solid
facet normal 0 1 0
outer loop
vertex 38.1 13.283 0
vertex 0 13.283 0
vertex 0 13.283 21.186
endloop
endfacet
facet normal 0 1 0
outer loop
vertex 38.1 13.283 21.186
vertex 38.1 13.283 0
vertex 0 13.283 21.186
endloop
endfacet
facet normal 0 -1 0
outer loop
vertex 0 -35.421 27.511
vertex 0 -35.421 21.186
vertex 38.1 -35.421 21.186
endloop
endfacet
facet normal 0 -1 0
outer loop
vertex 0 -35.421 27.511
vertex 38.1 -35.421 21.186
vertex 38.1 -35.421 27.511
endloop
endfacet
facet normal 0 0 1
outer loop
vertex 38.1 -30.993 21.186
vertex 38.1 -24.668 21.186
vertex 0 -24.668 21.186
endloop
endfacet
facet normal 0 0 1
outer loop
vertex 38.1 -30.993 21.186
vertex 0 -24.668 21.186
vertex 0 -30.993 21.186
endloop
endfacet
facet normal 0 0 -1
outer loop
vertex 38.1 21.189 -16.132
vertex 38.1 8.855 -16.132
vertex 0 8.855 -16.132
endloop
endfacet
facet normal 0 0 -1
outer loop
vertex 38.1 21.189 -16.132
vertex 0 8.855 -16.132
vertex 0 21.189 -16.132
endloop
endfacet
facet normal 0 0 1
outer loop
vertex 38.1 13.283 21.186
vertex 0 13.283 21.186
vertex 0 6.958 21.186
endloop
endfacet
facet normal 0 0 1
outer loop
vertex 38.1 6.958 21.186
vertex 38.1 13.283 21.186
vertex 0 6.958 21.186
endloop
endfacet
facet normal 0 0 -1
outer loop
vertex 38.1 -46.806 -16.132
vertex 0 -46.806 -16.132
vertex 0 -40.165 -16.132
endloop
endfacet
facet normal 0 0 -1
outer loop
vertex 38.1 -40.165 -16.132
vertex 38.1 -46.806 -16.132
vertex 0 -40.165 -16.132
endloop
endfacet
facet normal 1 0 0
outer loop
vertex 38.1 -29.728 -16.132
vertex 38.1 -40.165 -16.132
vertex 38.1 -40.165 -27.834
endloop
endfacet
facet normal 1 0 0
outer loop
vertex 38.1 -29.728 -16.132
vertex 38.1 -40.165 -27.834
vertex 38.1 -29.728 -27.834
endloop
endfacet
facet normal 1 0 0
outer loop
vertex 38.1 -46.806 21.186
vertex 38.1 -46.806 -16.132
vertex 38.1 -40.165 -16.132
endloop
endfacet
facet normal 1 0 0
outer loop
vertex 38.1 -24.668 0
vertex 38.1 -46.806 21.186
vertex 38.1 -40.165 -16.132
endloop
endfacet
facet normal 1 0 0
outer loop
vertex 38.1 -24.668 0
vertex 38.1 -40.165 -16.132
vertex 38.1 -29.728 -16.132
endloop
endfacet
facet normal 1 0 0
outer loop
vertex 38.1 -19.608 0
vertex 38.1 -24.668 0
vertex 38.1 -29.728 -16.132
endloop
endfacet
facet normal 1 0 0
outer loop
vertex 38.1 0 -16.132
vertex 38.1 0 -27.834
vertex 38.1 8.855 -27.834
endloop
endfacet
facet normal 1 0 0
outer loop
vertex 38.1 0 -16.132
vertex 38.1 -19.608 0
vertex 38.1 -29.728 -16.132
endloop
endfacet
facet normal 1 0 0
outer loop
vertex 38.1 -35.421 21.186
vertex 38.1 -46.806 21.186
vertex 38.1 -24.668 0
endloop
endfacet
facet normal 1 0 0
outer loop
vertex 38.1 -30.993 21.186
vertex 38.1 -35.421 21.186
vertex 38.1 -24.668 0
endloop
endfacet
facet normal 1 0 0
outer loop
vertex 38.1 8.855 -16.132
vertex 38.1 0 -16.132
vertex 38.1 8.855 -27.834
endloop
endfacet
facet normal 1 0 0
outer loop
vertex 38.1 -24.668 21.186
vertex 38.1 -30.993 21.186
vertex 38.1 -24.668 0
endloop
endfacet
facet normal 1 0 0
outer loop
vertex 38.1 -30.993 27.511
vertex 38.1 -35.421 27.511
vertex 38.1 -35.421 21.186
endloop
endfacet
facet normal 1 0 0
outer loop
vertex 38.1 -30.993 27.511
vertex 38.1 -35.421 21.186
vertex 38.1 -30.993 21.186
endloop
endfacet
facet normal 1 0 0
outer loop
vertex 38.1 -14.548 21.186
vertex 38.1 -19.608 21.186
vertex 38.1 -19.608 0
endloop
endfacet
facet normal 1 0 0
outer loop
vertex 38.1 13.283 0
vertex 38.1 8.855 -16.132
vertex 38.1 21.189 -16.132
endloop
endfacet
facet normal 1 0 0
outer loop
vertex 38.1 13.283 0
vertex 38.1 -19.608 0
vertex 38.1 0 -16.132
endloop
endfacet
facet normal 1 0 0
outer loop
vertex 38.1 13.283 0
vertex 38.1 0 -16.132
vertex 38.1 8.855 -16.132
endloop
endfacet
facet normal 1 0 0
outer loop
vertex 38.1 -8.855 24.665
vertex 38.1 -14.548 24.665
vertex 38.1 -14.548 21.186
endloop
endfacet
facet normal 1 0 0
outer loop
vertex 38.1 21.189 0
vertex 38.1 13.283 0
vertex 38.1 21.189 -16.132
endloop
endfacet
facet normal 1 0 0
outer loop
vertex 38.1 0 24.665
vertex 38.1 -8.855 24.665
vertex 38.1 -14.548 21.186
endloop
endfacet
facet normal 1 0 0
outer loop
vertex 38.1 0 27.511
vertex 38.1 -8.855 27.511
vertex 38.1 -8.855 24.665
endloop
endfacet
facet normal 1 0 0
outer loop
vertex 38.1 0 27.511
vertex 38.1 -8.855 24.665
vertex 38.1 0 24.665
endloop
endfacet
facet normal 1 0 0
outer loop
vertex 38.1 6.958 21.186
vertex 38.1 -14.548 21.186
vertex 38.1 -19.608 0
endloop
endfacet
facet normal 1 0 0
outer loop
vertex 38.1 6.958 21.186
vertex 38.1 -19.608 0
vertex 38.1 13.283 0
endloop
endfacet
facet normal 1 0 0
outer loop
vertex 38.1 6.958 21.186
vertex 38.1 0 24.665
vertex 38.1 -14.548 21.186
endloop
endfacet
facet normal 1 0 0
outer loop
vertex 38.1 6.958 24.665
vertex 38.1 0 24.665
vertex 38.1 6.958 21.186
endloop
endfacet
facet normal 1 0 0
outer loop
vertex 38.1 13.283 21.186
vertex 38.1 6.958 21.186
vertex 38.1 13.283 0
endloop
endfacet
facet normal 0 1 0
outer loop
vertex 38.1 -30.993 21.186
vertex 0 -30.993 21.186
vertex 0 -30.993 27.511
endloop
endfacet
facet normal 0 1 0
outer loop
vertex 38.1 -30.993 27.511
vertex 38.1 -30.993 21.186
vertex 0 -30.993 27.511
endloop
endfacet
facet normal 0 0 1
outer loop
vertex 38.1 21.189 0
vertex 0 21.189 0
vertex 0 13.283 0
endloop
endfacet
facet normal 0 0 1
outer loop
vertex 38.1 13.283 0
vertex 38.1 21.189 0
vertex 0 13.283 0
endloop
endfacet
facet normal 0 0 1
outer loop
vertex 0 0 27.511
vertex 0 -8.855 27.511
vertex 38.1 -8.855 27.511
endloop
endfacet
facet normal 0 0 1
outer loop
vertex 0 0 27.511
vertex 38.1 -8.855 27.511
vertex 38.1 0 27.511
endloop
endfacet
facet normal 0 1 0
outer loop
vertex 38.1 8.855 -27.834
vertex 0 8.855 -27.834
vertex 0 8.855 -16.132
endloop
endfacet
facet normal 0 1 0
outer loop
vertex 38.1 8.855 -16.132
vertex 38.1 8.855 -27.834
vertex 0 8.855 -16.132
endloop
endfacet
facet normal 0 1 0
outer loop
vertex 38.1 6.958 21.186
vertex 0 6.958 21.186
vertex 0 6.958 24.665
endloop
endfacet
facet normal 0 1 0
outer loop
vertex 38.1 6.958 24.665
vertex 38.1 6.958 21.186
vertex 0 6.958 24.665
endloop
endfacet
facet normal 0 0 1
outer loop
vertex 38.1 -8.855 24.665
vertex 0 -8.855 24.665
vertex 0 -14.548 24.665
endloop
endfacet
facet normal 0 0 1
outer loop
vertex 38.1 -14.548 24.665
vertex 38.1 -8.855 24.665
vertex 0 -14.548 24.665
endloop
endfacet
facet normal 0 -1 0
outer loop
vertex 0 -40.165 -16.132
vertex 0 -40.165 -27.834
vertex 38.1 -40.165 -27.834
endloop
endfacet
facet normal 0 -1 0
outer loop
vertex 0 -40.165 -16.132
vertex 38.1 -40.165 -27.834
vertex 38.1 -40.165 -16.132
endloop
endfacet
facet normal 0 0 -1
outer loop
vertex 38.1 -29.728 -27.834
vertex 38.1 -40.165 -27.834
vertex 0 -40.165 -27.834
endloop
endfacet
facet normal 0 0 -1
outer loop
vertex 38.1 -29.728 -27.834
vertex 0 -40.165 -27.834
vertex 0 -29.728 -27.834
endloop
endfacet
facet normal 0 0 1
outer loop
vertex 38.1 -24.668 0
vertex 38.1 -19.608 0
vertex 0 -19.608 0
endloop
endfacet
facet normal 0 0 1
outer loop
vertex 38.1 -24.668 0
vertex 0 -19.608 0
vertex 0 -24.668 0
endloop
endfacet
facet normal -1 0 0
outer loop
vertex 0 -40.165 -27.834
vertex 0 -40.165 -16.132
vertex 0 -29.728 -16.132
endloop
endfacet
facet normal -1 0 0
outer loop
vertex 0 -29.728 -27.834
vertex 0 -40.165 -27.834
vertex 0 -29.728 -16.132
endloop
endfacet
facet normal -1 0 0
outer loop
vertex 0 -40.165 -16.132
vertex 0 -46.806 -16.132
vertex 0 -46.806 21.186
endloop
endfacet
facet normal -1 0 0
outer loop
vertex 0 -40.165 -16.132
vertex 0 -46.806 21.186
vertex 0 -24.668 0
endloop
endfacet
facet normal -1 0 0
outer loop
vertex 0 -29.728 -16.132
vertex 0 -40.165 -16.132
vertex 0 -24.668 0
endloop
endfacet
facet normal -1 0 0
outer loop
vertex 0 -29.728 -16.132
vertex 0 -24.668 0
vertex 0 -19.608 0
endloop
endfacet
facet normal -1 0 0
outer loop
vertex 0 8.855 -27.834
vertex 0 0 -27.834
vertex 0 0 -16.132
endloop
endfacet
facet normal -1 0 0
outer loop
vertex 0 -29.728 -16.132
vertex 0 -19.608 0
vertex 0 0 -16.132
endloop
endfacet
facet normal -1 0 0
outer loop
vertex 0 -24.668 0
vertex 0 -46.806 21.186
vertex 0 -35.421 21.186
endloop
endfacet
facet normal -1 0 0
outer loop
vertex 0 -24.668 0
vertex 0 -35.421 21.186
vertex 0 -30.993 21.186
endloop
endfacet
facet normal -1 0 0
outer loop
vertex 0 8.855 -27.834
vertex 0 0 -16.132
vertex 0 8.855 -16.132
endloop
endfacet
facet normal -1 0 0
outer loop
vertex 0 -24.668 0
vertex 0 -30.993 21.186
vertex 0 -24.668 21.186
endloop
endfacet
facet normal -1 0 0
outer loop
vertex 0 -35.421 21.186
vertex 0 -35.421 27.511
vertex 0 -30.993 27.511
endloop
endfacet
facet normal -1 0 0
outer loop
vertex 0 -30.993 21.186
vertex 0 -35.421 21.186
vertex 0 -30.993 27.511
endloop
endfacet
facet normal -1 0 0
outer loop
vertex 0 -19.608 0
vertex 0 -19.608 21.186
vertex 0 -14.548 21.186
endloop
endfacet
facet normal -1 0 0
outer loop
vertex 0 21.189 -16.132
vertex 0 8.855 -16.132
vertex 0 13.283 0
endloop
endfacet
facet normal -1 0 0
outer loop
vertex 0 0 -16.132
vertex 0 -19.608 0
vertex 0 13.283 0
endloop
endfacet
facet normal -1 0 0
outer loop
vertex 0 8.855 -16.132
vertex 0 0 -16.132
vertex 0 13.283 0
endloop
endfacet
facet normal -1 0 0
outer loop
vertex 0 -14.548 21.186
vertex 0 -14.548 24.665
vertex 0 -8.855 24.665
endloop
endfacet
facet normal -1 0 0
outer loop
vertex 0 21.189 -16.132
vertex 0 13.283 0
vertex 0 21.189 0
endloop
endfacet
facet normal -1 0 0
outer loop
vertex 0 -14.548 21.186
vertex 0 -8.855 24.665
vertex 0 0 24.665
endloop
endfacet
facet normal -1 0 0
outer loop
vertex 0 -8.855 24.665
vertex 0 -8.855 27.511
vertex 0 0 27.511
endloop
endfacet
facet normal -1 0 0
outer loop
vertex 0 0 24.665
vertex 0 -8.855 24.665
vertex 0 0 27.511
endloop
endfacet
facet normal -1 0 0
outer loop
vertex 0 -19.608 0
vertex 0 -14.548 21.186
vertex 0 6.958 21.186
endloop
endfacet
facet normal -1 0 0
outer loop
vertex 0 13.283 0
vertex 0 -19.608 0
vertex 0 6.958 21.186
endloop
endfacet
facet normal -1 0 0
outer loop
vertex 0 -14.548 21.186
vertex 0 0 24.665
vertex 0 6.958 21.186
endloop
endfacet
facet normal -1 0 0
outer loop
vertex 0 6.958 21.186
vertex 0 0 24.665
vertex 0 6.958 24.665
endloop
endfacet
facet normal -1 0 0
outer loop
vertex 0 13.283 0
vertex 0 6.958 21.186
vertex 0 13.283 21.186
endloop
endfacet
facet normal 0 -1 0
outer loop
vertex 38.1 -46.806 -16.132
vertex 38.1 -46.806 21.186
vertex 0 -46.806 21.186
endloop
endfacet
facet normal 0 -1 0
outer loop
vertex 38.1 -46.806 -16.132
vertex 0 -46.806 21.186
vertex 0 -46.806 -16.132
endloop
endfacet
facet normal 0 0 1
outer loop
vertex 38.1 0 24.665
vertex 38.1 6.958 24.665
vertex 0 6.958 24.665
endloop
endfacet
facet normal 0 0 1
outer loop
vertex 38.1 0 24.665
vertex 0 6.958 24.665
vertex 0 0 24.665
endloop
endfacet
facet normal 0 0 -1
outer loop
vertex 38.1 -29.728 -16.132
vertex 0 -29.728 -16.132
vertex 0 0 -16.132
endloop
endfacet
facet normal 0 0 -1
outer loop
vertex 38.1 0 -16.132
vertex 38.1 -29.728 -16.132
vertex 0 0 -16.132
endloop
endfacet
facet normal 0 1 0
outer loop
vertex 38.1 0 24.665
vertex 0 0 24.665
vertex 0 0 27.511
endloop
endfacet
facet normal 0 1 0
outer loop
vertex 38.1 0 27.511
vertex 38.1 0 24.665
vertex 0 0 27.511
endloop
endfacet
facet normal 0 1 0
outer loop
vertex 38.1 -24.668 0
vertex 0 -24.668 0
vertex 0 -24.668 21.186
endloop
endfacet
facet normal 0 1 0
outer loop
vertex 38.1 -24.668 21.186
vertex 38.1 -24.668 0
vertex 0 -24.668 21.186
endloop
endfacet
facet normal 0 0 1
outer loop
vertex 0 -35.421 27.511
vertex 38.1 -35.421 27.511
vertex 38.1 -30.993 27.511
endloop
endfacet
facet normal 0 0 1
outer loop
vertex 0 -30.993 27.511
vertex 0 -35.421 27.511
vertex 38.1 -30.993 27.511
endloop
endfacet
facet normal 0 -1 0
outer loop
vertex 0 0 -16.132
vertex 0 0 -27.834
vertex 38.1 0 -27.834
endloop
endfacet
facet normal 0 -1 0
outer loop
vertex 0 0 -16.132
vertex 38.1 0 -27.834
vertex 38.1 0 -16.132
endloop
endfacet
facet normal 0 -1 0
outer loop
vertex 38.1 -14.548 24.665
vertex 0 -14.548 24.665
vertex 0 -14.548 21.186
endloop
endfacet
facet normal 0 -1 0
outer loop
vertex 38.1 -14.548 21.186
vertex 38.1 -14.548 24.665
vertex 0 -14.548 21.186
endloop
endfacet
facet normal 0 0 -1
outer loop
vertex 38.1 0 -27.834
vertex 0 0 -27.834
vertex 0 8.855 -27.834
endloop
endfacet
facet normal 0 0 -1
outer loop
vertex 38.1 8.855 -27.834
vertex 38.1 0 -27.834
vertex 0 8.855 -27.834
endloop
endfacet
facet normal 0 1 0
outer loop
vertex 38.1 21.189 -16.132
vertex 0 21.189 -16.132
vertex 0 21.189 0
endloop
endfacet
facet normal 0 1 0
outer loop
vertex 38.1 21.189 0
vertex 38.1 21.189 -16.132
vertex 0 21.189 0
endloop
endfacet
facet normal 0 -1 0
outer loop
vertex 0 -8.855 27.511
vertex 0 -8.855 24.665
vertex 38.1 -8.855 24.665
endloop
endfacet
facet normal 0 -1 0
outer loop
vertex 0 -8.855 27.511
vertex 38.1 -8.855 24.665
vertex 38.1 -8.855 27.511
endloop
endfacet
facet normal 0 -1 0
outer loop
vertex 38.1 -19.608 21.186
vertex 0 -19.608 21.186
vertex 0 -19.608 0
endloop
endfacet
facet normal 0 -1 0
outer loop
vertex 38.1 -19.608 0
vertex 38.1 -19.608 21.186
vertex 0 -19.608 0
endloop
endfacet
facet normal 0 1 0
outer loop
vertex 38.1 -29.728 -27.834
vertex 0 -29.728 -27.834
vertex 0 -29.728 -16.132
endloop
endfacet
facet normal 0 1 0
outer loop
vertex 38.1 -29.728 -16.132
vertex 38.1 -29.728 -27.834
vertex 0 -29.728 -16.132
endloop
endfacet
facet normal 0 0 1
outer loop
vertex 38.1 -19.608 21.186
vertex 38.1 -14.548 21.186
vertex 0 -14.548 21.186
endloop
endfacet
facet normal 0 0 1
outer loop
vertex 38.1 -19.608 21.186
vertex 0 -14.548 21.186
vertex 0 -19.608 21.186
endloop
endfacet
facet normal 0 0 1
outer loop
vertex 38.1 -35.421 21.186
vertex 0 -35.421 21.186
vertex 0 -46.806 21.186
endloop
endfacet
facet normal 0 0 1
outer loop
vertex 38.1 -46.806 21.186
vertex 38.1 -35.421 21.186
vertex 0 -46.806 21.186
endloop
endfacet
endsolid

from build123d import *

# Parameters (mm, degrees)
F0_W     = 8.8552413508
F0_H     = 2.8463285416
F0_W_2   = 4.4276230037
F0_H_2   = 6.3251759857
F0_H_3   = 11.7015708238
F0_W_3   = 10.4365367442
F1_DEPTH = 38.1


with BuildPart() as f1:
    # F0 (on Right) → F1 (new body)
    with BuildSketch(Plane.YZ):
        Polygon((-14.5478984341, 21.1860537529), (6.9576902315, 21.1860537529), (6.9576902315, 24.664901197), (0, 24.664901197), (-8.8552413508, 24.664901197), (-14.5478984341, 24.664901197), align=None)
        with Locations((-4.4276206754, 26.0880654678)):
            Rectangle(F0_W, F0_H)
        Polygon((-19.6080375463, 0), (13.2828634232, 0), (13.2828634232, 21.1860537529), (6.9576902315, 21.1860537529), (-14.5478984341, 21.1860537529), (-19.6080375463, 21.1860537529), align=None)
        Polygon((8.8552413508, -16.132466495), (21.1893301457, -16.132466495), (21.1893301457, 0), (13.2828634232, 0), (-19.6080375463, 0), (-24.6681738645, 0), (-46.8062832952, 0), (-46.8062832952, -16.132466495), (-40.1648506522, -16.132466495), (-29.728313908, -16.132466495), (0, -16.132466495), align=None)
        Polygon((-46.8062832952, 0), (-24.6681738645, 0), (-24.6681738645, 21.1860537529), (-30.9933461249, 21.1860537529), (-35.4209691286, 21.1860537529), (-46.8062832952, 21.1860537529), align=None)
        with Locations((-33.2071576267, 24.3486417457)):
            Rectangle(F0_W_2, F0_H_2)
        with Locations((4.4276206754, -21.9832519069)):
            Rectangle(F0_W, F0_H_3)
        with Locations((-34.9465822801, -21.9832519069)):
            Rectangle(F0_W_3, F0_H_3)
    extrude(amount=F1_DEPTH)


solid = f1.part
